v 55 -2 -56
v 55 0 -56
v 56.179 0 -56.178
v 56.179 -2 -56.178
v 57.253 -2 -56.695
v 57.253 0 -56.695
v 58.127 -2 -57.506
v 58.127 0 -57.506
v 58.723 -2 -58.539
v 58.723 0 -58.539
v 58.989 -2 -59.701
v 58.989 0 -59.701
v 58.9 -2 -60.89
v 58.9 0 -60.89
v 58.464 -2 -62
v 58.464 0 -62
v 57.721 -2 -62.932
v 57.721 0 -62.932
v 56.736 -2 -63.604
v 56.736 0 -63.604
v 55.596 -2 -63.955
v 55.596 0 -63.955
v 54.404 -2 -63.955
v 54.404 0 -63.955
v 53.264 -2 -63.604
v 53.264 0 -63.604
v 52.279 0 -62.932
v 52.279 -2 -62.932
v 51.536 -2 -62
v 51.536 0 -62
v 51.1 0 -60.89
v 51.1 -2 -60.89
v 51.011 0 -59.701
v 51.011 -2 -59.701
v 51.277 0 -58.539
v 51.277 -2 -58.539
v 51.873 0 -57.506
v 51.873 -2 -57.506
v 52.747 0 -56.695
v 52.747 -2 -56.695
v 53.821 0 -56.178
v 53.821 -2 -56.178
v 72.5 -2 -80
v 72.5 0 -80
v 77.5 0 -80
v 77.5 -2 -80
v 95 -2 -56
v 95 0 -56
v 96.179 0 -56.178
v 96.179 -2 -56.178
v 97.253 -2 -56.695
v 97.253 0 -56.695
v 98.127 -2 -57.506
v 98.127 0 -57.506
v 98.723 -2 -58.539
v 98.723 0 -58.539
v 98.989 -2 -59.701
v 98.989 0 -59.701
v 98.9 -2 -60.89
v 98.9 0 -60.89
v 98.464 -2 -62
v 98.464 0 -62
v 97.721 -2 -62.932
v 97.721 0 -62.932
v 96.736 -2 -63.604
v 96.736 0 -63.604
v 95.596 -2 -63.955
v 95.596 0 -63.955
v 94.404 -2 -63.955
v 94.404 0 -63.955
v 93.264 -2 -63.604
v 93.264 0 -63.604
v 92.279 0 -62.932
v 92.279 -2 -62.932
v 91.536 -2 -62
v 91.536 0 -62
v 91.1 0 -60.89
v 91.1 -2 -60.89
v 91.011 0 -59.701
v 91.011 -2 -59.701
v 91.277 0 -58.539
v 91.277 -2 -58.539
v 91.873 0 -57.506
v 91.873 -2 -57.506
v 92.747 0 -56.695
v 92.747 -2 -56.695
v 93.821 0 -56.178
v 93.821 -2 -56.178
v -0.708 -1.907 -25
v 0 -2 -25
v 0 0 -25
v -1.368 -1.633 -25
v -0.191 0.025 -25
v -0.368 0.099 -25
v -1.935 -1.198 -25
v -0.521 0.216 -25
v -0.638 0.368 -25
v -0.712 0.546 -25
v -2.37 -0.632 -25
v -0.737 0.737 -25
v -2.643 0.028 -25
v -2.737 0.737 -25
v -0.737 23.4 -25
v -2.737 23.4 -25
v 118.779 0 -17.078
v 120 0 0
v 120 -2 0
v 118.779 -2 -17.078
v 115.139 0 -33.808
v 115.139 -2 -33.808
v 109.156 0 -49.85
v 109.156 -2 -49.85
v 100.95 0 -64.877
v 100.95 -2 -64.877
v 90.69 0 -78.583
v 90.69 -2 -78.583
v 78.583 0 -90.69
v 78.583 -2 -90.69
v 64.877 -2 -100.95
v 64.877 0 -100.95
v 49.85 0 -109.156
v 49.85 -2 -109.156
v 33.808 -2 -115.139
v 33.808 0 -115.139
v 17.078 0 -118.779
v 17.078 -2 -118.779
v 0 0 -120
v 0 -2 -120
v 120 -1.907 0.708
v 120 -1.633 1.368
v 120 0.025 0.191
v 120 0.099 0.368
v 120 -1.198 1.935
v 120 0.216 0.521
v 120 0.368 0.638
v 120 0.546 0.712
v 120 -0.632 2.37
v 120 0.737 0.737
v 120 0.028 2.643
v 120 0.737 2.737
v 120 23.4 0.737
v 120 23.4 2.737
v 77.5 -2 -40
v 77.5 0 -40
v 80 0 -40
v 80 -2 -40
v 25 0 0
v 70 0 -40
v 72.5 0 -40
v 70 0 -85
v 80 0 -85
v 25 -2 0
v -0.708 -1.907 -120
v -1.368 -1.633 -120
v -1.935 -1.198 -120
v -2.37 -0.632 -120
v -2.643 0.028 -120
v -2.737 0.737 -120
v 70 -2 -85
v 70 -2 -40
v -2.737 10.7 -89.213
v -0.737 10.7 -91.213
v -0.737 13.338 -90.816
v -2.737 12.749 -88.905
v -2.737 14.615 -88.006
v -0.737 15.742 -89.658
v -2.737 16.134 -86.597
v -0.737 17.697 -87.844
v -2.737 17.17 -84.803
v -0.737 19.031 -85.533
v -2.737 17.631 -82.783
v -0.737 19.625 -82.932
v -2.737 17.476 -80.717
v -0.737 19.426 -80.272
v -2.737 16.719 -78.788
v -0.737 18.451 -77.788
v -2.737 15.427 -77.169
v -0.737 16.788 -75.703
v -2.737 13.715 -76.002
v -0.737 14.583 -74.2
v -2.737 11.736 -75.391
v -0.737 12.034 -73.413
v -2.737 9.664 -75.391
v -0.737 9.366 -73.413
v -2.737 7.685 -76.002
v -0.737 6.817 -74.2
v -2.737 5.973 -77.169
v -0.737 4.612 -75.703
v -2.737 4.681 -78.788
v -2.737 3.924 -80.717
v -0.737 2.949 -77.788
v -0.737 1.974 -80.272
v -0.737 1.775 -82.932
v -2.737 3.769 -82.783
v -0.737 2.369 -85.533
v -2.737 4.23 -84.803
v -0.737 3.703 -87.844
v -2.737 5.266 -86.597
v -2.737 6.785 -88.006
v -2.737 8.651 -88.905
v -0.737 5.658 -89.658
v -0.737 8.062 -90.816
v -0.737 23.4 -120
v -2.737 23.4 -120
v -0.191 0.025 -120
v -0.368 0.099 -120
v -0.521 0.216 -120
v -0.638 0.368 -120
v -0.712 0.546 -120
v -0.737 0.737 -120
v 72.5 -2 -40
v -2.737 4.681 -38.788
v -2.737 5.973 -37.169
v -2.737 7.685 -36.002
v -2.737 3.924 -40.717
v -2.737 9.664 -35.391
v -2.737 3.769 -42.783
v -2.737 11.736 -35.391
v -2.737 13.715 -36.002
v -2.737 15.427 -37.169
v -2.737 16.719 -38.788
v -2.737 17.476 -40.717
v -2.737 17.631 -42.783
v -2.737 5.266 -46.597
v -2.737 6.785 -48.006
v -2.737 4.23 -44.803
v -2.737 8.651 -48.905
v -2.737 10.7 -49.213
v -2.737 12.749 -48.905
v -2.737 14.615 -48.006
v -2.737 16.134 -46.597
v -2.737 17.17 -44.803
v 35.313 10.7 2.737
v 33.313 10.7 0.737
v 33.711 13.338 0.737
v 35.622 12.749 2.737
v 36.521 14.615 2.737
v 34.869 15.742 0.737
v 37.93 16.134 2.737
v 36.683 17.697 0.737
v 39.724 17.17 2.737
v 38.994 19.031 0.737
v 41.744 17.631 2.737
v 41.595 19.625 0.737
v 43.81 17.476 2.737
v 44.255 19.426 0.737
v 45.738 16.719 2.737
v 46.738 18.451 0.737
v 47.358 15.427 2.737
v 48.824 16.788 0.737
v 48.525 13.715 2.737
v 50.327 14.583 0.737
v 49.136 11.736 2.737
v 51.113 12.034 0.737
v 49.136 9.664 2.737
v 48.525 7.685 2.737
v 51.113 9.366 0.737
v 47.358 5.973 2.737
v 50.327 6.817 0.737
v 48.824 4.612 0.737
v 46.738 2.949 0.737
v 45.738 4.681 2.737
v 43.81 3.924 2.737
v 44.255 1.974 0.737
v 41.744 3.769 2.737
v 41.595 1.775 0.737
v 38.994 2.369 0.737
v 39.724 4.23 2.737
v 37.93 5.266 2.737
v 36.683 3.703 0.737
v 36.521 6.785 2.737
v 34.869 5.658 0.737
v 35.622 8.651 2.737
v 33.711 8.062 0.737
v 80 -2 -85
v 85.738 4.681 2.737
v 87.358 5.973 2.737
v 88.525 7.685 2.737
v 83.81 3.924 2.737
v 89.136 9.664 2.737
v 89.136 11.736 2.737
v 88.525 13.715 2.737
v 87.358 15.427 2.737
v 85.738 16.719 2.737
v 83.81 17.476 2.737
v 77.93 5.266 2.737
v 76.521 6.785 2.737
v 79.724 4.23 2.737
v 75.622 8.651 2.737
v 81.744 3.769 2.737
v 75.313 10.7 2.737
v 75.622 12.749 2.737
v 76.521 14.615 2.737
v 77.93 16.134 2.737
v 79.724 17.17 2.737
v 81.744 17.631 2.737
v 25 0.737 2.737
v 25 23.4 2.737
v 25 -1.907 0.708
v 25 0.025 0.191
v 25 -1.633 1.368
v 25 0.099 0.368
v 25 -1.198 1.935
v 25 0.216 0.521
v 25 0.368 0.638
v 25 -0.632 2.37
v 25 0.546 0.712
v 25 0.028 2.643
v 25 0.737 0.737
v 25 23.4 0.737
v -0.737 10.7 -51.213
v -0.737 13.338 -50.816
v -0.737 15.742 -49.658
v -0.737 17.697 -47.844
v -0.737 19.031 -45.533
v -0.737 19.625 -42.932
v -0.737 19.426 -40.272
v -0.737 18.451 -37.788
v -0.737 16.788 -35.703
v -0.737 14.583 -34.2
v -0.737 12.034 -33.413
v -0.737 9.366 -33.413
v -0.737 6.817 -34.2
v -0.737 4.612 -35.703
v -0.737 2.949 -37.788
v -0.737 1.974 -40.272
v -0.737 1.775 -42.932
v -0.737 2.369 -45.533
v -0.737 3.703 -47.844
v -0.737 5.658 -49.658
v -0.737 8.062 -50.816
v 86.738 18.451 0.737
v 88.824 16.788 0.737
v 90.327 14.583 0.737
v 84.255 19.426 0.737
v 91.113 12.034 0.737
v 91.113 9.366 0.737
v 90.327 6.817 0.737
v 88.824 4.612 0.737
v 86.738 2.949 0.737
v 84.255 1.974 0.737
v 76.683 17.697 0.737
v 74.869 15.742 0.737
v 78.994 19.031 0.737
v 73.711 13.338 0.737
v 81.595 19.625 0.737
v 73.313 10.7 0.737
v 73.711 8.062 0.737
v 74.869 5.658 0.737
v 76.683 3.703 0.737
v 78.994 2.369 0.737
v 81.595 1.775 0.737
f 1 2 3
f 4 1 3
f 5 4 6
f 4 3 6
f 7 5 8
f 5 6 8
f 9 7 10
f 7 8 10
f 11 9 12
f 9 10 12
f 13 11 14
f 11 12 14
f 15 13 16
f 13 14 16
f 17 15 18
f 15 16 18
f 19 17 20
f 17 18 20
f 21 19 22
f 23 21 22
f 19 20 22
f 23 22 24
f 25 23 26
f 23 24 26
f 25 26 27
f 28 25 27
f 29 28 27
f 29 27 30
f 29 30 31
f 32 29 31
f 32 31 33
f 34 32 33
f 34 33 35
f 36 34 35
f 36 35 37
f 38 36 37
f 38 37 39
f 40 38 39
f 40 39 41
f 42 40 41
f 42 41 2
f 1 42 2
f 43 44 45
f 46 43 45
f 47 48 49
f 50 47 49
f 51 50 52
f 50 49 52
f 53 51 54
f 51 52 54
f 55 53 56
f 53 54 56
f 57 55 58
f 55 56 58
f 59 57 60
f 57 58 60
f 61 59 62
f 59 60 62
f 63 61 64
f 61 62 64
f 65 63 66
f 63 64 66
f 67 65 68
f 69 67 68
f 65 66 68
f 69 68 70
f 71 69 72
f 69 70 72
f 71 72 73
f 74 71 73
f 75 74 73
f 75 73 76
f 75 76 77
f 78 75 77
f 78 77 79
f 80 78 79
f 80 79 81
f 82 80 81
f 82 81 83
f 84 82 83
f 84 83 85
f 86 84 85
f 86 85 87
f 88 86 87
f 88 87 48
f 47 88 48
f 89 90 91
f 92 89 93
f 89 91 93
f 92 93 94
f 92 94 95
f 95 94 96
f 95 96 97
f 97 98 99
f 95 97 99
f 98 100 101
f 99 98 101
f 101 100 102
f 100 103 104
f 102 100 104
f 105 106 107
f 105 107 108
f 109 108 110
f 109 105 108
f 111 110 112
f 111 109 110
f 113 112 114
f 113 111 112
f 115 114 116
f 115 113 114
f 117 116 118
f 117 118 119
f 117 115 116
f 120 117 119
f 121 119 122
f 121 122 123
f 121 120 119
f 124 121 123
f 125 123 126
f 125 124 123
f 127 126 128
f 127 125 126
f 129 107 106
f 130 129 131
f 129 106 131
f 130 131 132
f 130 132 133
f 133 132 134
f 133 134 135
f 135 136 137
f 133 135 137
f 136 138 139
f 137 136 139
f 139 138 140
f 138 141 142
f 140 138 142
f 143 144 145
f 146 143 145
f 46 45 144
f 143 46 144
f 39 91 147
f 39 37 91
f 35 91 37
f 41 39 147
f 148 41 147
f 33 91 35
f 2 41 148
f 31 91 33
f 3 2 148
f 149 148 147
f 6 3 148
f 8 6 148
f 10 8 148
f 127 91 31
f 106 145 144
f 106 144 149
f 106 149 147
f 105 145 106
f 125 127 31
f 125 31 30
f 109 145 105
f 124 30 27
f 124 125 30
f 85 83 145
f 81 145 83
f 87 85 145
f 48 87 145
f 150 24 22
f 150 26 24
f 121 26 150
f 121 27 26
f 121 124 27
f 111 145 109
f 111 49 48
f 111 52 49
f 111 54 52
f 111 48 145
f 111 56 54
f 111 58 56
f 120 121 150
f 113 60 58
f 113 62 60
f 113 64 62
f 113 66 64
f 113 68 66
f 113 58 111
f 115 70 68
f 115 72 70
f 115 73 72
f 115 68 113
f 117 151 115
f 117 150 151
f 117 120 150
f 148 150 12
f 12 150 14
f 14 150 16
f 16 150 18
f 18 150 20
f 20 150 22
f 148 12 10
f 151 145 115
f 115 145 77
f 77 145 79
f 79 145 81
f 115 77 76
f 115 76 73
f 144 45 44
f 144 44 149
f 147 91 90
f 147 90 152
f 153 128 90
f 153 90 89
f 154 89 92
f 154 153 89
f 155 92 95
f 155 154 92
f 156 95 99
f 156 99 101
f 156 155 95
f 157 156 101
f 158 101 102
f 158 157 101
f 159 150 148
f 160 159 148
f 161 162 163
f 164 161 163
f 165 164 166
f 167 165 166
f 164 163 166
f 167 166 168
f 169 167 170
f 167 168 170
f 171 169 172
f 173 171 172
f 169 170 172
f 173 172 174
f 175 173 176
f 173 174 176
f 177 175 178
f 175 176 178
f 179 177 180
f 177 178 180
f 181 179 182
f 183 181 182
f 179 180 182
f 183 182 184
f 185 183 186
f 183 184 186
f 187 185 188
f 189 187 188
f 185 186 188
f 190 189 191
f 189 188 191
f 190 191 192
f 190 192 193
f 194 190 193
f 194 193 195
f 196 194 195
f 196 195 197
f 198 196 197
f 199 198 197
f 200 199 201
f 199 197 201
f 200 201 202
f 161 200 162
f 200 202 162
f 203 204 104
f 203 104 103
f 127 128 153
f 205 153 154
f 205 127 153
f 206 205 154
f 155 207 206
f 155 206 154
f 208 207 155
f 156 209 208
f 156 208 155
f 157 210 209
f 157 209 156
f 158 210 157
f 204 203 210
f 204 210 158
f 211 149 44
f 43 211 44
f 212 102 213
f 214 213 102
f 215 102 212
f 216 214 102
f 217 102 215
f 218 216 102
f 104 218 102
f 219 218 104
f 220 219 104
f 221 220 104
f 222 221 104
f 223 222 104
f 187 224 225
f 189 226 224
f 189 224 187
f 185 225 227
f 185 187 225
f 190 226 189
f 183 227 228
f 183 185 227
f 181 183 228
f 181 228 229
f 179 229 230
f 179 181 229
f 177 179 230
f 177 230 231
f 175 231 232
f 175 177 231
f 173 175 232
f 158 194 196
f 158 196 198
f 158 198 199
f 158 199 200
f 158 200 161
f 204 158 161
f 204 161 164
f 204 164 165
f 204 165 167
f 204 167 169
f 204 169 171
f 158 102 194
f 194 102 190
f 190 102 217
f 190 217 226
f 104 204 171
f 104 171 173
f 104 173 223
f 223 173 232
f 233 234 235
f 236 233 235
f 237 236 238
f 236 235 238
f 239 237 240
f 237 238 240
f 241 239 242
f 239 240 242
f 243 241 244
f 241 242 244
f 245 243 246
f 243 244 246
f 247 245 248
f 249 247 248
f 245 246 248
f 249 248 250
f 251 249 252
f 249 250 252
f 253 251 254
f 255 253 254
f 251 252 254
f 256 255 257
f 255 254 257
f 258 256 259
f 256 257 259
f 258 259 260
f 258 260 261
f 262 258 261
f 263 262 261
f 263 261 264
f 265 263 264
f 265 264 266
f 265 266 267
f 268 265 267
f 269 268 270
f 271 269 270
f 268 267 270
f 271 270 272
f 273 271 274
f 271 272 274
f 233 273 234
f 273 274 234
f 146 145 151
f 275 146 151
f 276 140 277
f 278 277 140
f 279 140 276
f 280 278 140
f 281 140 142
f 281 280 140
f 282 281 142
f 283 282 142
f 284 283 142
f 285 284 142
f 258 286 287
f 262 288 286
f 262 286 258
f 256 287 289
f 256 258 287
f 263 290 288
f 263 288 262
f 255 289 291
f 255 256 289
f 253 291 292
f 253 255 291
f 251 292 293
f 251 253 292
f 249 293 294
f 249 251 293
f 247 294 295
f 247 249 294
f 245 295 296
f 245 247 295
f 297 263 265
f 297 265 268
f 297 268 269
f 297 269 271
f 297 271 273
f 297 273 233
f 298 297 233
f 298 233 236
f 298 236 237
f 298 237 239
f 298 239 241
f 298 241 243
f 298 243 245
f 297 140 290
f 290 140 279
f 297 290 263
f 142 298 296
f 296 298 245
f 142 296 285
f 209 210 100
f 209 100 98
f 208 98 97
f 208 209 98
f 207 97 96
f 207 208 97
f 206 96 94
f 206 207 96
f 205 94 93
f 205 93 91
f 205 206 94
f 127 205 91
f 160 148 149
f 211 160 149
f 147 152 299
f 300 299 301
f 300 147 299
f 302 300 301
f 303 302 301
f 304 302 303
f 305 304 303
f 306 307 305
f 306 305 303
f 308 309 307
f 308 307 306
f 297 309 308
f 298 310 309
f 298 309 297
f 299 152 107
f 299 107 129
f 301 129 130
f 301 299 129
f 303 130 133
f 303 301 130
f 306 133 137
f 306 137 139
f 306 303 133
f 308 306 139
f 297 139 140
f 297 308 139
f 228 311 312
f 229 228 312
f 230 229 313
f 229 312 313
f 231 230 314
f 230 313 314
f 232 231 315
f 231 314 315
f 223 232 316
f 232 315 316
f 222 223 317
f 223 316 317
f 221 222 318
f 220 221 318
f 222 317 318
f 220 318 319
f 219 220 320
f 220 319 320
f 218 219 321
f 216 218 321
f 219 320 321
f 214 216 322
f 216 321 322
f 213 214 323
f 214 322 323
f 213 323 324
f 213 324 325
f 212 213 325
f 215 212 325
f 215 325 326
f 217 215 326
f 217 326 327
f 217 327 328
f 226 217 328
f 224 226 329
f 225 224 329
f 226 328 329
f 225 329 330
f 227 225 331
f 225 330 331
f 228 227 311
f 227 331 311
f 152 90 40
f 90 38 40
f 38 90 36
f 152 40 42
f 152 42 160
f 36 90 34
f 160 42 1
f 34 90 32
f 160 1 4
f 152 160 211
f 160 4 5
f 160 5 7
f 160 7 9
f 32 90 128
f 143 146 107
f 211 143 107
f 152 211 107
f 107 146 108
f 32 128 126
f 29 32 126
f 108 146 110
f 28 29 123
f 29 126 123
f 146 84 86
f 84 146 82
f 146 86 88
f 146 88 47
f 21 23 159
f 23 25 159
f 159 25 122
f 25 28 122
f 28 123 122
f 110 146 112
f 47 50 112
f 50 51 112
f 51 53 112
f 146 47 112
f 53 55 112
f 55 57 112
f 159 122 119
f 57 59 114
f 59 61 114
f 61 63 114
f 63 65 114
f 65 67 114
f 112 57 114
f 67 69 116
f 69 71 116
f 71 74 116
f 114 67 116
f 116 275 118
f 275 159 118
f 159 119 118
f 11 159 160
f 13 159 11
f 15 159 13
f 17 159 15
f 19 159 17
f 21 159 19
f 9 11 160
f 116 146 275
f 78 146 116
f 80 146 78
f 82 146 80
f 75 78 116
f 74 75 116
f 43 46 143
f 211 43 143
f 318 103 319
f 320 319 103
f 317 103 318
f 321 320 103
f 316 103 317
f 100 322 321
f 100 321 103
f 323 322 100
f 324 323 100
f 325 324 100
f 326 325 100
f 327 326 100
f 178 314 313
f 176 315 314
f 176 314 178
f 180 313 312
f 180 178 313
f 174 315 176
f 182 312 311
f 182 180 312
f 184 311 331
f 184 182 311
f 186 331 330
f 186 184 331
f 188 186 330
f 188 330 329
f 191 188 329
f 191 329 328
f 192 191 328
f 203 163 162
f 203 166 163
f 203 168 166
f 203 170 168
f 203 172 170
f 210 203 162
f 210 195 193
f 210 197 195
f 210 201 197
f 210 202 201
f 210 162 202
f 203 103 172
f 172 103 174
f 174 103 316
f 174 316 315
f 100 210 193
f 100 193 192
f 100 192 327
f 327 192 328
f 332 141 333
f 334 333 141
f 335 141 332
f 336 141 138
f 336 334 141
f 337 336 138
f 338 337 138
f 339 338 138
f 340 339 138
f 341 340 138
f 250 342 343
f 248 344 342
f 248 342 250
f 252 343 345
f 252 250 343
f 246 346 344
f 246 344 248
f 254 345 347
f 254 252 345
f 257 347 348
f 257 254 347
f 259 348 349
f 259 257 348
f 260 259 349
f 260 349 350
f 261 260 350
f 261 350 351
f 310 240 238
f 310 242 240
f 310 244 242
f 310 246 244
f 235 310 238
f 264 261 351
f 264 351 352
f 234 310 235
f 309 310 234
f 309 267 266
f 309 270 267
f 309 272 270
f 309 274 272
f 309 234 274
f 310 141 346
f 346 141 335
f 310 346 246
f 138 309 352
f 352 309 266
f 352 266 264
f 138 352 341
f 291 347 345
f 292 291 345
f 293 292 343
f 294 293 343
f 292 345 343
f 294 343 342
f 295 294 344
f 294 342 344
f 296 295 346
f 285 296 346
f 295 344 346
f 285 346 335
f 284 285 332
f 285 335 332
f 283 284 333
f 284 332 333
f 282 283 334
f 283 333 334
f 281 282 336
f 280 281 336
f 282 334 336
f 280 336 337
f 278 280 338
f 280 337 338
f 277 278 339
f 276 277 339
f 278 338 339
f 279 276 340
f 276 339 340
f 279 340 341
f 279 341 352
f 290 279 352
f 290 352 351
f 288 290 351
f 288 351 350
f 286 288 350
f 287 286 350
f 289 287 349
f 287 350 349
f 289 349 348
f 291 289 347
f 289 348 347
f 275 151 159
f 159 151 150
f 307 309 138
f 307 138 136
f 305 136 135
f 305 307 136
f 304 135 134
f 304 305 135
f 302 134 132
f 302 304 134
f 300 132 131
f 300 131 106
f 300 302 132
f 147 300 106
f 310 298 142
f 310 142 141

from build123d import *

# Parameters (mm, degrees)
BRIDA_BASE1_DEPTH               = 2
BRIDA_DE_ARISTA1_DEPTH          = 95
BRIDA_DE_ARISTA2_DEPTH          = 95
CROQUIS16_R                     = 4
CORTAR_EXTRUIR3_DEPTH           = 10
CROQUIS17_R                     = 8.95
CORTAR_EXTRUIR5_DEPTH           = 2
CORTAR_EXTRUIR5_DRAFT           = -45
CORTAR_EXTRUIR5_PROFILE_2_DEPTH = 2
CORTAR_EXTRUIR5_PROFILE_2_DRAFT = -45
CROQUIS18_R                     = 8.95
CORTAR_EXTRUIR6_DEPTH           = 2
CORTAR_EXTRUIR6_DRAFT           = -45
CORTAR_EXTRUIR6_PROFILE_2_DEPTH = 2
CORTAR_EXTRUIR6_PROFILE_2_DRAFT = -45


# Sheet-metal steps are written as plain solids
with BuildPart() as part:
    # Croquis1 → Brida base1 (new body)
    with BuildSketch(Plane(origin=(0, 0, 0), x_dir=(1, 0, 0), z_dir=(0, 1, 0))):
        with BuildLine():
            Line((0, 25), (25, 0))
            Line((25, 0), (120, 0))
            ThreePointArc((120, 0), (84.852813742, 84.852813742), (0, 120))
            Line((0, 120), (0, 25))
        make_face()
    extrude(amount=-BRIDA_BASE1_DEPTH)

    # Brida de arista1 section (across the edge) → Brida de arista1 (add)
    with BuildSketch(Plane(origin=(25, 0, 0.7366), x_dir=(0, 0, -1), z_dir=(1, 0, 0))):
        with BuildLine():
            Line((-2, 0.7366), (-2, 23.4))
            Line((-2, 23.4), (0, 23.4))
            Line((0, 23.4), (0, 0.7366))
            ThreePointArc((0, 0.7366), (0.215745145, 0.215745145), (0.7366, 0))
            Line((0.7366, 0), (0.7366, -2))
            ThreePointArc((0.7366, -2), (-1.198468417, -1.198468417), (-2, 0.7366))
        make_face()
    extrude(amount=BRIDA_DE_ARISTA1_DEPTH)

    # Brida de arista2 section (across the edge) → Brida de arista2 (add)
    with BuildSketch(Plane(origin=(-0.7366, 0, -120), x_dir=(1, 0, 0), z_dir=(0, 0, 1))):
        with BuildLine():
            Line((-2, 0.7366), (-2, 23.4))
            Line((-2, 23.4), (0, 23.4))
            Line((0, 23.4), (0, 0.7366))
            ThreePointArc((0, 0.7366), (0.215745145, 0.215745145), (0.7366, 0))
            Line((0.7366, 0), (0.7366, -2))
            ThreePointArc((0.7366, -2), (-1.198468417, -1.198468417), (-2, 0.7366))
        make_face()
    extrude(amount=BRIDA_DE_ARISTA2_DEPTH)

    # Croquis16 → Cortar-Extruir3 (cut)
    with BuildSketch(Plane(origin=(0, 0, 0), x_dir=(1, 0, 0), z_dir=(0, 1, 0))):
        with Locations(Location((55, 60, 0), (0, 0, 270))):
            Circle(CROQUIS16_R)
        with Locations(Location((95, 60, 0), (0, 0, 270))):
            Circle(CROQUIS16_R)
        Polygon((70, 40), (72.5, 40), (72.5, 80), (77.5, 80), (77.5, 40), (80, 40), (80, 85), (70, 85), align=None)
    extrude(amount=-CORTAR_EXTRUIR3_DEPTH, mode=Mode.SUBTRACT)


with BuildPart() as cortar_extruir5_tool:
    # Croquis17 → Cortar-Extruir5 (with draft: the straight prism first)
    with BuildSketch(Plane(origin=(0, 0, 0.7366), x_dir=(-1, 0, 0), z_dir=(0, 0, -1))):
        with Locations((-42.2634, 10.7)):
            Circle(CROQUIS17_R)
    extrude(amount=-CORTAR_EXTRUIR5_DEPTH)
    # Cortar-Extruir5: the draft: its side faces are tilted about the plane it starts from
    cortar_extruir5_sides = [cortar_extruir5_tool.faces().sort_by_distance(p)[0] for p in [
        (51.2134, 10.7, 1.7366),
    ]]
    draft(cortar_extruir5_sides, Plane(origin=(0, 0, 0.7366), x_dir=(-1, 0, 0), z_dir=(0, 0, -1)), CORTAR_EXTRUIR5_DRAFT)


with BuildPart() as part_1:
    add(part.part)

    # Cortar-Extruir5: cut by cortar_extruir5_tool
    add(cortar_extruir5_tool.part, mode=Mode.SUBTRACT)


with BuildPart() as cortar_extruir5_profile_2_tool:
    # Croquis17 → Cortar-Extruir5 profile 2 (with draft: the straight prism first)
    with BuildSketch(Plane(origin=(0, 0, 0.7366), x_dir=(-1, 0, 0), z_dir=(0, 0, -1))):
        with Locations((-82.2634, 10.7)):
            Circle(CROQUIS17_R)
    extrude(amount=-CORTAR_EXTRUIR5_PROFILE_2_DEPTH)
    # Cortar-Extruir5 profile 2: the draft: its side faces are tilted about the plane it starts from
    cortar_extruir5_profile_2_sides = [cortar_extruir5_profile_2_tool.faces().sort_by_distance(p)[0] for p in [
        (91.2134, 10.7, 1.7366),
    ]]
    draft(cortar_extruir5_profile_2_sides, Plane(origin=(0, 0, 0.7366), x_dir=(-1, 0, 0), z_dir=(0, 0, -1)), CORTAR_EXTRUIR5_PROFILE_2_DRAFT)


with BuildPart() as part_2:
    add(part_1.part)

    # Cortar-Extruir5 profile 2: cut by cortar_extruir5_profile_2_tool
    add(cortar_extruir5_profile_2_tool.part, mode=Mode.SUBTRACT)


with BuildPart() as cortar_extruir6_tool:
    # Croquis18 → Cortar-Extruir6 (with draft: the straight prism first)
    with BuildSketch(Plane(origin=(-0.7366, 0, 0), x_dir=(0, 0, -1), z_dir=(1, 0, 0))):
        with Locations((42.2634, 10.7)):
            Circle(CROQUIS18_R)
    extrude(amount=-CORTAR_EXTRUIR6_DEPTH)
    # Cortar-Extruir6: the draft: its side faces are tilted about the plane it starts from
    cortar_extruir6_sides = [cortar_extruir6_tool.faces().sort_by_distance(p)[0] for p in [
        (-1.7366, 10.7, -33.3134),
    ]]
    draft(cortar_extruir6_sides, Plane(origin=(-0.7366, 0, 0), x_dir=(0, 0, -1), z_dir=(1, 0, 0)), CORTAR_EXTRUIR6_DRAFT)


with BuildPart() as part_3:
    add(part_2.part)

    # Cortar-Extruir6: cut by cortar_extruir6_tool
    add(cortar_extruir6_tool.part, mode=Mode.SUBTRACT)


with BuildPart() as cortar_extruir6_profile_2_tool:
    # Croquis18 → Cortar-Extruir6 profile 2 (with draft: the straight prism first)
    with BuildSketch(Plane(origin=(-0.7366, 0, 0), x_dir=(0, 0, -1), z_dir=(1, 0, 0))):
        with Locations((82.2634, 10.7)):
            Circle(CROQUIS18_R)
    extrude(amount=-CORTAR_EXTRUIR6_PROFILE_2_DEPTH)
    # Cortar-Extruir6 profile 2: the draft: its side faces are tilted about the plane it starts from
    cortar_extruir6_profile_2_sides = [cortar_extruir6_profile_2_tool.faces().sort_by_distance(p)[0] for p in [
        (-1.7366, 10.7, -73.3134),
    ]]
    draft(cortar_extruir6_profile_2_sides, Plane(origin=(-0.7366, 0, 0), x_dir=(0, 0, -1), z_dir=(1, 0, 0)), CORTAR_EXTRUIR6_PROFILE_2_DRAFT)


with BuildPart() as part_4:
    add(part_3.part)

    # Cortar-Extruir6 profile 2: cut by cortar_extruir6_profile_2_tool
    add(cortar_extruir6_profile_2_tool.part, mode=Mode.SUBTRACT)


solid = part_4.part
